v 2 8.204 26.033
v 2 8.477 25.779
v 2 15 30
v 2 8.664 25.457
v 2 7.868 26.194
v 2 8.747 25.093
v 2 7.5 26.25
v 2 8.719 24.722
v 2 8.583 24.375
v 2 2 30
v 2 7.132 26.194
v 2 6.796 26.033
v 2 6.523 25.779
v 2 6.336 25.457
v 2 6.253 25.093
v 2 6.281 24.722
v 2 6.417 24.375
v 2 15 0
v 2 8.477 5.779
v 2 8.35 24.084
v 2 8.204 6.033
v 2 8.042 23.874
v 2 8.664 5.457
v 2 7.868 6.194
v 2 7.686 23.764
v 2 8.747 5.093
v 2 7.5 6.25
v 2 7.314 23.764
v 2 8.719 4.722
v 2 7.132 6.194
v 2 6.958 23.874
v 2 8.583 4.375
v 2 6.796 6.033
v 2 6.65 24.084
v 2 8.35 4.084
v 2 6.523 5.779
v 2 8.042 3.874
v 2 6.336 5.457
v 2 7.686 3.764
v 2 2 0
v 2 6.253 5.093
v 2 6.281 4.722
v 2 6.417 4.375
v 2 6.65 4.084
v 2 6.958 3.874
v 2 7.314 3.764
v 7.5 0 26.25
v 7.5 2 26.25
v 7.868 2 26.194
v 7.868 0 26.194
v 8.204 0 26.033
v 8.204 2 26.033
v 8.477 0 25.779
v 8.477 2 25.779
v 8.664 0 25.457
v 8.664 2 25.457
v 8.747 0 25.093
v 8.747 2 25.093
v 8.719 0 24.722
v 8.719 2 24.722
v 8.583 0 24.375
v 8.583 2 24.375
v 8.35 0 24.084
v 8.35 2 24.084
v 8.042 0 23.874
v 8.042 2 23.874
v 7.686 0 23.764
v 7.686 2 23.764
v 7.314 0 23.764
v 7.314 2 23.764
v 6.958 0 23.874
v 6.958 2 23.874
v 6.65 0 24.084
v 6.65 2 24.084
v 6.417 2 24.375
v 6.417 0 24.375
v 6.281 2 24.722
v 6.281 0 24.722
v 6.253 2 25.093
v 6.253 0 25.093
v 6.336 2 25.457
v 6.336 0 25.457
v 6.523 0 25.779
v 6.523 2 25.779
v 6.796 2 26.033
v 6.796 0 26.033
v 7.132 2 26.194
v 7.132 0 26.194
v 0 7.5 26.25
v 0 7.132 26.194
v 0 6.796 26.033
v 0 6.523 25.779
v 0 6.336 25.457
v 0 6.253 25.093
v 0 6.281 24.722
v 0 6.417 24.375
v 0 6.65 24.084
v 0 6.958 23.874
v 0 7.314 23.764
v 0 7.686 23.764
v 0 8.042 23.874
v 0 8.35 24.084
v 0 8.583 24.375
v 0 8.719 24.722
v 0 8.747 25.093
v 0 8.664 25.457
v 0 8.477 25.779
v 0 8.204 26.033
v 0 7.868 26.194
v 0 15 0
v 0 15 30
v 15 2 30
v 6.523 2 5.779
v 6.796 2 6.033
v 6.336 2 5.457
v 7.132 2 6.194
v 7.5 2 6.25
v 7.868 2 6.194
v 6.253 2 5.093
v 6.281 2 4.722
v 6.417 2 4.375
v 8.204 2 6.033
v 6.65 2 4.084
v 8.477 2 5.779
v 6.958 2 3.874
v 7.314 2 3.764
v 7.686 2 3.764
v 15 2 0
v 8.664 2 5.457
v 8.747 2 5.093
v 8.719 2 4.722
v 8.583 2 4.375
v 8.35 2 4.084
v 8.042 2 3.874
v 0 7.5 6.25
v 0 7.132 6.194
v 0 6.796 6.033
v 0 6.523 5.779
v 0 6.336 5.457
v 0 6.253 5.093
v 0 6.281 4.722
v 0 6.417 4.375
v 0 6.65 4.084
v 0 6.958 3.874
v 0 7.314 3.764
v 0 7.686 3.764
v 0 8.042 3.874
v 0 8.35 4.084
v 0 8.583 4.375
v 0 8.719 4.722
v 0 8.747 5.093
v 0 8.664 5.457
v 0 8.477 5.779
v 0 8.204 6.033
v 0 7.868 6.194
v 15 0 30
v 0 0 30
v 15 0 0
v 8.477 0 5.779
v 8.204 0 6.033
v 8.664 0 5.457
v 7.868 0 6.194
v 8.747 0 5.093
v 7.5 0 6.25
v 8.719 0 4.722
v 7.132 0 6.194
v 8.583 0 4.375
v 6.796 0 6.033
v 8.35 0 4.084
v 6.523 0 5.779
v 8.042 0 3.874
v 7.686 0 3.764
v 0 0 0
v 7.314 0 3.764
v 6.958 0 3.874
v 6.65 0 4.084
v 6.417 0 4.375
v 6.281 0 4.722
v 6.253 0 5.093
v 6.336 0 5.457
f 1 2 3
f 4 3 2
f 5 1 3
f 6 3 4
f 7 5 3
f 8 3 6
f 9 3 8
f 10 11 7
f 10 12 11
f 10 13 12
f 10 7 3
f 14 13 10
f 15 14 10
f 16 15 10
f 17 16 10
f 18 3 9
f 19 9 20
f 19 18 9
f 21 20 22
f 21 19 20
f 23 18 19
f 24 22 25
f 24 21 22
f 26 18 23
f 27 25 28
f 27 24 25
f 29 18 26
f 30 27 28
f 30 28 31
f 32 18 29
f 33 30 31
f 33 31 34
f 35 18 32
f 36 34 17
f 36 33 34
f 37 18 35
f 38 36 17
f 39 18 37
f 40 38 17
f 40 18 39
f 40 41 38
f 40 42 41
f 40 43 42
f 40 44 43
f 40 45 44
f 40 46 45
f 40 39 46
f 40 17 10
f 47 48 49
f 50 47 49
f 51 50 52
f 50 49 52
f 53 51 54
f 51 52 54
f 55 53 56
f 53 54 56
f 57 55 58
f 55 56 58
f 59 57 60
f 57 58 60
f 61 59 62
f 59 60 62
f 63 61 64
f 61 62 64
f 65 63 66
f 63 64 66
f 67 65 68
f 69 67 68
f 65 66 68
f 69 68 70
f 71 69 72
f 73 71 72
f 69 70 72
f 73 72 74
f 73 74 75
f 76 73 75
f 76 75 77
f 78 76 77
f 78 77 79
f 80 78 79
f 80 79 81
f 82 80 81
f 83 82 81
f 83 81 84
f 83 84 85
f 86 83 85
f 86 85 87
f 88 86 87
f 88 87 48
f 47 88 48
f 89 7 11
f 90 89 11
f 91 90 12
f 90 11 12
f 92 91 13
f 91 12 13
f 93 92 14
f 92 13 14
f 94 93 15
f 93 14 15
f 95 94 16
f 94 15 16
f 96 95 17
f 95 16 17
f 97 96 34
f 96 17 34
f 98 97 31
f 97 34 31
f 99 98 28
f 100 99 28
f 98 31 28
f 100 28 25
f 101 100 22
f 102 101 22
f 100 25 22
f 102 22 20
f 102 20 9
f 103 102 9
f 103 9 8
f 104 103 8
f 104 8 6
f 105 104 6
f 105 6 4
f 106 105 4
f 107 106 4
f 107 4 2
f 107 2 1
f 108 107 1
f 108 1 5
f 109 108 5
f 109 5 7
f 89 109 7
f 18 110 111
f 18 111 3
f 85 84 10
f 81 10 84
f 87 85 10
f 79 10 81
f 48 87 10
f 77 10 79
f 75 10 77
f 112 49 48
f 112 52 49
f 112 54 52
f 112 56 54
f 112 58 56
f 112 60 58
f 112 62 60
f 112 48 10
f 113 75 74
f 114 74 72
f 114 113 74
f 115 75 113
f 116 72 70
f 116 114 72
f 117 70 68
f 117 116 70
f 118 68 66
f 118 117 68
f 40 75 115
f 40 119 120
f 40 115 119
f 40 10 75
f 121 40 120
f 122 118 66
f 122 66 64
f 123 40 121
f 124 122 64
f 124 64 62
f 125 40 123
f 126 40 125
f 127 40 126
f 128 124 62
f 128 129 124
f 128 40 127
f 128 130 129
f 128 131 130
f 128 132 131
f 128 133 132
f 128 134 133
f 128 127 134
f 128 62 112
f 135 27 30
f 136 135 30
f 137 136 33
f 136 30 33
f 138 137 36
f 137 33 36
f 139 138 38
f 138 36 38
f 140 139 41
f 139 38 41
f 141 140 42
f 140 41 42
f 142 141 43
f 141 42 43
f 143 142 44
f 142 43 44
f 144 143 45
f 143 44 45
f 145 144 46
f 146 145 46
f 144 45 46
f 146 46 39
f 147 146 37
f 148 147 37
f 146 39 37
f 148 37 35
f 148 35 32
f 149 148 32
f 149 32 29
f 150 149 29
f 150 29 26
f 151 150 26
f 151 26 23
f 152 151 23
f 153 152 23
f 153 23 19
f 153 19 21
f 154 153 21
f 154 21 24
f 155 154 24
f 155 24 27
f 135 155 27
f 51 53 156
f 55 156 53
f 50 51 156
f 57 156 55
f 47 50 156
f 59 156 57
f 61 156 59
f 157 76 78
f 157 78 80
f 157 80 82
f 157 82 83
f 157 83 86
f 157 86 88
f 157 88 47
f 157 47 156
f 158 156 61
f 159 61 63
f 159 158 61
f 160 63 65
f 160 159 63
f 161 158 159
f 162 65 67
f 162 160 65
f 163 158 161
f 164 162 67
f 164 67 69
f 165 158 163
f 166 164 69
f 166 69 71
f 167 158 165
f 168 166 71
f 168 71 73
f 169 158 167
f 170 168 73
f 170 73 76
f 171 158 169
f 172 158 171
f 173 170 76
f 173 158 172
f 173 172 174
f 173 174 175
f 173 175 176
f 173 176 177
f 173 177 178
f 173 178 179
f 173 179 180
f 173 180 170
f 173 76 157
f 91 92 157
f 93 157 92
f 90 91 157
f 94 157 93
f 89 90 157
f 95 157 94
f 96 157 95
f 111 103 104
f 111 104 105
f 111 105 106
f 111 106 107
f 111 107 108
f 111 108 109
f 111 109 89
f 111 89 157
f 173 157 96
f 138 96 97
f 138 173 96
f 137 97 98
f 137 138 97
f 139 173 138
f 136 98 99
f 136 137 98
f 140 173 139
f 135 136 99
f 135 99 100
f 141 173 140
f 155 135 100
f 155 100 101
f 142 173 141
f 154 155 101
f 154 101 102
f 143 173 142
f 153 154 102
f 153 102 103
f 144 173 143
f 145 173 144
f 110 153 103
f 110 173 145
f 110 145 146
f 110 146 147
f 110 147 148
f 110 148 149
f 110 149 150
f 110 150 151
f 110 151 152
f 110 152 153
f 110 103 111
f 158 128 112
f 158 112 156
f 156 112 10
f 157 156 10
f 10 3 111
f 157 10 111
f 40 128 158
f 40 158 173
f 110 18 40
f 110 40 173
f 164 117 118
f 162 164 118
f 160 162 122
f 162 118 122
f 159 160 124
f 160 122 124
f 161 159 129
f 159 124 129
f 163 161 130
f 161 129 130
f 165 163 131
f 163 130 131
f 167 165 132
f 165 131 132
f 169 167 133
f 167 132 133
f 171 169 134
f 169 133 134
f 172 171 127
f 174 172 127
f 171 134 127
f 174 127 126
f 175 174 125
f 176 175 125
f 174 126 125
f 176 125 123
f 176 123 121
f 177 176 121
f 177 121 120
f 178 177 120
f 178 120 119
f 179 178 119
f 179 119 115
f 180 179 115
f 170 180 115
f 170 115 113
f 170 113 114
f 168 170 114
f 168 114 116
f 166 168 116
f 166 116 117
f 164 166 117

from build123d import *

# Parameters (mm, degrees)
EXTRUDE_1_DEPTH          = 30
M3X0_5_1_D               = 2.5
M3X0_5_1_DEPTH           = 8.5
M3X0_5_1_TIP             = 0.751075774
M3X0_5_1_ON_FACE_2_D     = 2.5
M3X0_5_1_ON_FACE_2_DEPTH = 8.5
M3X0_5_1_ON_FACE_2_TIP   = 0.751075774


with BuildPart() as part:
    # ｽｹｯﾁ1 → ﾎﾞｽ - 押し出し1 (new body)
    with BuildSketch(Plane.XY):
        Polygon((0, 0), (0, 15), (2, 15), (2, 2), (15, 2), (15, 0), align=None)
    extrude(amount=EXTRUDE_1_DEPTH)

    # M3x0.5 ねじ穴1
    with Locations(Plane(origin=(7.5, 0, 5), x_dir=(0, 0, -1), z_dir=(0, -1, 0))):
        with Locations((0, 0), (-20, 0)):
            Hole(M3X0_5_1_D / 2, depth=M3X0_5_1_DEPTH)
            with Locations((0, 0, -(M3X0_5_1_DEPTH + M3X0_5_1_TIP / 2))):  # 118° drill point
                Cone(0, M3X0_5_1_D / 2, M3X0_5_1_TIP, mode=Mode.SUBTRACT)

    # M3x0.5 ねじ穴1 on face 2
    with Locations(Plane(origin=(0, 7.5, 25), x_dir=(0, 0, -1), z_dir=(-1, 0, 0))):
        with Locations((0, 0), (20, 0)):
            Hole(M3X0_5_1_ON_FACE_2_D / 2, depth=M3X0_5_1_ON_FACE_2_DEPTH)
            with Locations((0, 0, -(M3X0_5_1_ON_FACE_2_DEPTH + M3X0_5_1_ON_FACE_2_TIP / 2))):  # 118° drill point
                Cone(0, M3X0_5_1_ON_FACE_2_D / 2, M3X0_5_1_ON_FACE_2_TIP, mode=Mode.SUBTRACT)


solid = part.part
